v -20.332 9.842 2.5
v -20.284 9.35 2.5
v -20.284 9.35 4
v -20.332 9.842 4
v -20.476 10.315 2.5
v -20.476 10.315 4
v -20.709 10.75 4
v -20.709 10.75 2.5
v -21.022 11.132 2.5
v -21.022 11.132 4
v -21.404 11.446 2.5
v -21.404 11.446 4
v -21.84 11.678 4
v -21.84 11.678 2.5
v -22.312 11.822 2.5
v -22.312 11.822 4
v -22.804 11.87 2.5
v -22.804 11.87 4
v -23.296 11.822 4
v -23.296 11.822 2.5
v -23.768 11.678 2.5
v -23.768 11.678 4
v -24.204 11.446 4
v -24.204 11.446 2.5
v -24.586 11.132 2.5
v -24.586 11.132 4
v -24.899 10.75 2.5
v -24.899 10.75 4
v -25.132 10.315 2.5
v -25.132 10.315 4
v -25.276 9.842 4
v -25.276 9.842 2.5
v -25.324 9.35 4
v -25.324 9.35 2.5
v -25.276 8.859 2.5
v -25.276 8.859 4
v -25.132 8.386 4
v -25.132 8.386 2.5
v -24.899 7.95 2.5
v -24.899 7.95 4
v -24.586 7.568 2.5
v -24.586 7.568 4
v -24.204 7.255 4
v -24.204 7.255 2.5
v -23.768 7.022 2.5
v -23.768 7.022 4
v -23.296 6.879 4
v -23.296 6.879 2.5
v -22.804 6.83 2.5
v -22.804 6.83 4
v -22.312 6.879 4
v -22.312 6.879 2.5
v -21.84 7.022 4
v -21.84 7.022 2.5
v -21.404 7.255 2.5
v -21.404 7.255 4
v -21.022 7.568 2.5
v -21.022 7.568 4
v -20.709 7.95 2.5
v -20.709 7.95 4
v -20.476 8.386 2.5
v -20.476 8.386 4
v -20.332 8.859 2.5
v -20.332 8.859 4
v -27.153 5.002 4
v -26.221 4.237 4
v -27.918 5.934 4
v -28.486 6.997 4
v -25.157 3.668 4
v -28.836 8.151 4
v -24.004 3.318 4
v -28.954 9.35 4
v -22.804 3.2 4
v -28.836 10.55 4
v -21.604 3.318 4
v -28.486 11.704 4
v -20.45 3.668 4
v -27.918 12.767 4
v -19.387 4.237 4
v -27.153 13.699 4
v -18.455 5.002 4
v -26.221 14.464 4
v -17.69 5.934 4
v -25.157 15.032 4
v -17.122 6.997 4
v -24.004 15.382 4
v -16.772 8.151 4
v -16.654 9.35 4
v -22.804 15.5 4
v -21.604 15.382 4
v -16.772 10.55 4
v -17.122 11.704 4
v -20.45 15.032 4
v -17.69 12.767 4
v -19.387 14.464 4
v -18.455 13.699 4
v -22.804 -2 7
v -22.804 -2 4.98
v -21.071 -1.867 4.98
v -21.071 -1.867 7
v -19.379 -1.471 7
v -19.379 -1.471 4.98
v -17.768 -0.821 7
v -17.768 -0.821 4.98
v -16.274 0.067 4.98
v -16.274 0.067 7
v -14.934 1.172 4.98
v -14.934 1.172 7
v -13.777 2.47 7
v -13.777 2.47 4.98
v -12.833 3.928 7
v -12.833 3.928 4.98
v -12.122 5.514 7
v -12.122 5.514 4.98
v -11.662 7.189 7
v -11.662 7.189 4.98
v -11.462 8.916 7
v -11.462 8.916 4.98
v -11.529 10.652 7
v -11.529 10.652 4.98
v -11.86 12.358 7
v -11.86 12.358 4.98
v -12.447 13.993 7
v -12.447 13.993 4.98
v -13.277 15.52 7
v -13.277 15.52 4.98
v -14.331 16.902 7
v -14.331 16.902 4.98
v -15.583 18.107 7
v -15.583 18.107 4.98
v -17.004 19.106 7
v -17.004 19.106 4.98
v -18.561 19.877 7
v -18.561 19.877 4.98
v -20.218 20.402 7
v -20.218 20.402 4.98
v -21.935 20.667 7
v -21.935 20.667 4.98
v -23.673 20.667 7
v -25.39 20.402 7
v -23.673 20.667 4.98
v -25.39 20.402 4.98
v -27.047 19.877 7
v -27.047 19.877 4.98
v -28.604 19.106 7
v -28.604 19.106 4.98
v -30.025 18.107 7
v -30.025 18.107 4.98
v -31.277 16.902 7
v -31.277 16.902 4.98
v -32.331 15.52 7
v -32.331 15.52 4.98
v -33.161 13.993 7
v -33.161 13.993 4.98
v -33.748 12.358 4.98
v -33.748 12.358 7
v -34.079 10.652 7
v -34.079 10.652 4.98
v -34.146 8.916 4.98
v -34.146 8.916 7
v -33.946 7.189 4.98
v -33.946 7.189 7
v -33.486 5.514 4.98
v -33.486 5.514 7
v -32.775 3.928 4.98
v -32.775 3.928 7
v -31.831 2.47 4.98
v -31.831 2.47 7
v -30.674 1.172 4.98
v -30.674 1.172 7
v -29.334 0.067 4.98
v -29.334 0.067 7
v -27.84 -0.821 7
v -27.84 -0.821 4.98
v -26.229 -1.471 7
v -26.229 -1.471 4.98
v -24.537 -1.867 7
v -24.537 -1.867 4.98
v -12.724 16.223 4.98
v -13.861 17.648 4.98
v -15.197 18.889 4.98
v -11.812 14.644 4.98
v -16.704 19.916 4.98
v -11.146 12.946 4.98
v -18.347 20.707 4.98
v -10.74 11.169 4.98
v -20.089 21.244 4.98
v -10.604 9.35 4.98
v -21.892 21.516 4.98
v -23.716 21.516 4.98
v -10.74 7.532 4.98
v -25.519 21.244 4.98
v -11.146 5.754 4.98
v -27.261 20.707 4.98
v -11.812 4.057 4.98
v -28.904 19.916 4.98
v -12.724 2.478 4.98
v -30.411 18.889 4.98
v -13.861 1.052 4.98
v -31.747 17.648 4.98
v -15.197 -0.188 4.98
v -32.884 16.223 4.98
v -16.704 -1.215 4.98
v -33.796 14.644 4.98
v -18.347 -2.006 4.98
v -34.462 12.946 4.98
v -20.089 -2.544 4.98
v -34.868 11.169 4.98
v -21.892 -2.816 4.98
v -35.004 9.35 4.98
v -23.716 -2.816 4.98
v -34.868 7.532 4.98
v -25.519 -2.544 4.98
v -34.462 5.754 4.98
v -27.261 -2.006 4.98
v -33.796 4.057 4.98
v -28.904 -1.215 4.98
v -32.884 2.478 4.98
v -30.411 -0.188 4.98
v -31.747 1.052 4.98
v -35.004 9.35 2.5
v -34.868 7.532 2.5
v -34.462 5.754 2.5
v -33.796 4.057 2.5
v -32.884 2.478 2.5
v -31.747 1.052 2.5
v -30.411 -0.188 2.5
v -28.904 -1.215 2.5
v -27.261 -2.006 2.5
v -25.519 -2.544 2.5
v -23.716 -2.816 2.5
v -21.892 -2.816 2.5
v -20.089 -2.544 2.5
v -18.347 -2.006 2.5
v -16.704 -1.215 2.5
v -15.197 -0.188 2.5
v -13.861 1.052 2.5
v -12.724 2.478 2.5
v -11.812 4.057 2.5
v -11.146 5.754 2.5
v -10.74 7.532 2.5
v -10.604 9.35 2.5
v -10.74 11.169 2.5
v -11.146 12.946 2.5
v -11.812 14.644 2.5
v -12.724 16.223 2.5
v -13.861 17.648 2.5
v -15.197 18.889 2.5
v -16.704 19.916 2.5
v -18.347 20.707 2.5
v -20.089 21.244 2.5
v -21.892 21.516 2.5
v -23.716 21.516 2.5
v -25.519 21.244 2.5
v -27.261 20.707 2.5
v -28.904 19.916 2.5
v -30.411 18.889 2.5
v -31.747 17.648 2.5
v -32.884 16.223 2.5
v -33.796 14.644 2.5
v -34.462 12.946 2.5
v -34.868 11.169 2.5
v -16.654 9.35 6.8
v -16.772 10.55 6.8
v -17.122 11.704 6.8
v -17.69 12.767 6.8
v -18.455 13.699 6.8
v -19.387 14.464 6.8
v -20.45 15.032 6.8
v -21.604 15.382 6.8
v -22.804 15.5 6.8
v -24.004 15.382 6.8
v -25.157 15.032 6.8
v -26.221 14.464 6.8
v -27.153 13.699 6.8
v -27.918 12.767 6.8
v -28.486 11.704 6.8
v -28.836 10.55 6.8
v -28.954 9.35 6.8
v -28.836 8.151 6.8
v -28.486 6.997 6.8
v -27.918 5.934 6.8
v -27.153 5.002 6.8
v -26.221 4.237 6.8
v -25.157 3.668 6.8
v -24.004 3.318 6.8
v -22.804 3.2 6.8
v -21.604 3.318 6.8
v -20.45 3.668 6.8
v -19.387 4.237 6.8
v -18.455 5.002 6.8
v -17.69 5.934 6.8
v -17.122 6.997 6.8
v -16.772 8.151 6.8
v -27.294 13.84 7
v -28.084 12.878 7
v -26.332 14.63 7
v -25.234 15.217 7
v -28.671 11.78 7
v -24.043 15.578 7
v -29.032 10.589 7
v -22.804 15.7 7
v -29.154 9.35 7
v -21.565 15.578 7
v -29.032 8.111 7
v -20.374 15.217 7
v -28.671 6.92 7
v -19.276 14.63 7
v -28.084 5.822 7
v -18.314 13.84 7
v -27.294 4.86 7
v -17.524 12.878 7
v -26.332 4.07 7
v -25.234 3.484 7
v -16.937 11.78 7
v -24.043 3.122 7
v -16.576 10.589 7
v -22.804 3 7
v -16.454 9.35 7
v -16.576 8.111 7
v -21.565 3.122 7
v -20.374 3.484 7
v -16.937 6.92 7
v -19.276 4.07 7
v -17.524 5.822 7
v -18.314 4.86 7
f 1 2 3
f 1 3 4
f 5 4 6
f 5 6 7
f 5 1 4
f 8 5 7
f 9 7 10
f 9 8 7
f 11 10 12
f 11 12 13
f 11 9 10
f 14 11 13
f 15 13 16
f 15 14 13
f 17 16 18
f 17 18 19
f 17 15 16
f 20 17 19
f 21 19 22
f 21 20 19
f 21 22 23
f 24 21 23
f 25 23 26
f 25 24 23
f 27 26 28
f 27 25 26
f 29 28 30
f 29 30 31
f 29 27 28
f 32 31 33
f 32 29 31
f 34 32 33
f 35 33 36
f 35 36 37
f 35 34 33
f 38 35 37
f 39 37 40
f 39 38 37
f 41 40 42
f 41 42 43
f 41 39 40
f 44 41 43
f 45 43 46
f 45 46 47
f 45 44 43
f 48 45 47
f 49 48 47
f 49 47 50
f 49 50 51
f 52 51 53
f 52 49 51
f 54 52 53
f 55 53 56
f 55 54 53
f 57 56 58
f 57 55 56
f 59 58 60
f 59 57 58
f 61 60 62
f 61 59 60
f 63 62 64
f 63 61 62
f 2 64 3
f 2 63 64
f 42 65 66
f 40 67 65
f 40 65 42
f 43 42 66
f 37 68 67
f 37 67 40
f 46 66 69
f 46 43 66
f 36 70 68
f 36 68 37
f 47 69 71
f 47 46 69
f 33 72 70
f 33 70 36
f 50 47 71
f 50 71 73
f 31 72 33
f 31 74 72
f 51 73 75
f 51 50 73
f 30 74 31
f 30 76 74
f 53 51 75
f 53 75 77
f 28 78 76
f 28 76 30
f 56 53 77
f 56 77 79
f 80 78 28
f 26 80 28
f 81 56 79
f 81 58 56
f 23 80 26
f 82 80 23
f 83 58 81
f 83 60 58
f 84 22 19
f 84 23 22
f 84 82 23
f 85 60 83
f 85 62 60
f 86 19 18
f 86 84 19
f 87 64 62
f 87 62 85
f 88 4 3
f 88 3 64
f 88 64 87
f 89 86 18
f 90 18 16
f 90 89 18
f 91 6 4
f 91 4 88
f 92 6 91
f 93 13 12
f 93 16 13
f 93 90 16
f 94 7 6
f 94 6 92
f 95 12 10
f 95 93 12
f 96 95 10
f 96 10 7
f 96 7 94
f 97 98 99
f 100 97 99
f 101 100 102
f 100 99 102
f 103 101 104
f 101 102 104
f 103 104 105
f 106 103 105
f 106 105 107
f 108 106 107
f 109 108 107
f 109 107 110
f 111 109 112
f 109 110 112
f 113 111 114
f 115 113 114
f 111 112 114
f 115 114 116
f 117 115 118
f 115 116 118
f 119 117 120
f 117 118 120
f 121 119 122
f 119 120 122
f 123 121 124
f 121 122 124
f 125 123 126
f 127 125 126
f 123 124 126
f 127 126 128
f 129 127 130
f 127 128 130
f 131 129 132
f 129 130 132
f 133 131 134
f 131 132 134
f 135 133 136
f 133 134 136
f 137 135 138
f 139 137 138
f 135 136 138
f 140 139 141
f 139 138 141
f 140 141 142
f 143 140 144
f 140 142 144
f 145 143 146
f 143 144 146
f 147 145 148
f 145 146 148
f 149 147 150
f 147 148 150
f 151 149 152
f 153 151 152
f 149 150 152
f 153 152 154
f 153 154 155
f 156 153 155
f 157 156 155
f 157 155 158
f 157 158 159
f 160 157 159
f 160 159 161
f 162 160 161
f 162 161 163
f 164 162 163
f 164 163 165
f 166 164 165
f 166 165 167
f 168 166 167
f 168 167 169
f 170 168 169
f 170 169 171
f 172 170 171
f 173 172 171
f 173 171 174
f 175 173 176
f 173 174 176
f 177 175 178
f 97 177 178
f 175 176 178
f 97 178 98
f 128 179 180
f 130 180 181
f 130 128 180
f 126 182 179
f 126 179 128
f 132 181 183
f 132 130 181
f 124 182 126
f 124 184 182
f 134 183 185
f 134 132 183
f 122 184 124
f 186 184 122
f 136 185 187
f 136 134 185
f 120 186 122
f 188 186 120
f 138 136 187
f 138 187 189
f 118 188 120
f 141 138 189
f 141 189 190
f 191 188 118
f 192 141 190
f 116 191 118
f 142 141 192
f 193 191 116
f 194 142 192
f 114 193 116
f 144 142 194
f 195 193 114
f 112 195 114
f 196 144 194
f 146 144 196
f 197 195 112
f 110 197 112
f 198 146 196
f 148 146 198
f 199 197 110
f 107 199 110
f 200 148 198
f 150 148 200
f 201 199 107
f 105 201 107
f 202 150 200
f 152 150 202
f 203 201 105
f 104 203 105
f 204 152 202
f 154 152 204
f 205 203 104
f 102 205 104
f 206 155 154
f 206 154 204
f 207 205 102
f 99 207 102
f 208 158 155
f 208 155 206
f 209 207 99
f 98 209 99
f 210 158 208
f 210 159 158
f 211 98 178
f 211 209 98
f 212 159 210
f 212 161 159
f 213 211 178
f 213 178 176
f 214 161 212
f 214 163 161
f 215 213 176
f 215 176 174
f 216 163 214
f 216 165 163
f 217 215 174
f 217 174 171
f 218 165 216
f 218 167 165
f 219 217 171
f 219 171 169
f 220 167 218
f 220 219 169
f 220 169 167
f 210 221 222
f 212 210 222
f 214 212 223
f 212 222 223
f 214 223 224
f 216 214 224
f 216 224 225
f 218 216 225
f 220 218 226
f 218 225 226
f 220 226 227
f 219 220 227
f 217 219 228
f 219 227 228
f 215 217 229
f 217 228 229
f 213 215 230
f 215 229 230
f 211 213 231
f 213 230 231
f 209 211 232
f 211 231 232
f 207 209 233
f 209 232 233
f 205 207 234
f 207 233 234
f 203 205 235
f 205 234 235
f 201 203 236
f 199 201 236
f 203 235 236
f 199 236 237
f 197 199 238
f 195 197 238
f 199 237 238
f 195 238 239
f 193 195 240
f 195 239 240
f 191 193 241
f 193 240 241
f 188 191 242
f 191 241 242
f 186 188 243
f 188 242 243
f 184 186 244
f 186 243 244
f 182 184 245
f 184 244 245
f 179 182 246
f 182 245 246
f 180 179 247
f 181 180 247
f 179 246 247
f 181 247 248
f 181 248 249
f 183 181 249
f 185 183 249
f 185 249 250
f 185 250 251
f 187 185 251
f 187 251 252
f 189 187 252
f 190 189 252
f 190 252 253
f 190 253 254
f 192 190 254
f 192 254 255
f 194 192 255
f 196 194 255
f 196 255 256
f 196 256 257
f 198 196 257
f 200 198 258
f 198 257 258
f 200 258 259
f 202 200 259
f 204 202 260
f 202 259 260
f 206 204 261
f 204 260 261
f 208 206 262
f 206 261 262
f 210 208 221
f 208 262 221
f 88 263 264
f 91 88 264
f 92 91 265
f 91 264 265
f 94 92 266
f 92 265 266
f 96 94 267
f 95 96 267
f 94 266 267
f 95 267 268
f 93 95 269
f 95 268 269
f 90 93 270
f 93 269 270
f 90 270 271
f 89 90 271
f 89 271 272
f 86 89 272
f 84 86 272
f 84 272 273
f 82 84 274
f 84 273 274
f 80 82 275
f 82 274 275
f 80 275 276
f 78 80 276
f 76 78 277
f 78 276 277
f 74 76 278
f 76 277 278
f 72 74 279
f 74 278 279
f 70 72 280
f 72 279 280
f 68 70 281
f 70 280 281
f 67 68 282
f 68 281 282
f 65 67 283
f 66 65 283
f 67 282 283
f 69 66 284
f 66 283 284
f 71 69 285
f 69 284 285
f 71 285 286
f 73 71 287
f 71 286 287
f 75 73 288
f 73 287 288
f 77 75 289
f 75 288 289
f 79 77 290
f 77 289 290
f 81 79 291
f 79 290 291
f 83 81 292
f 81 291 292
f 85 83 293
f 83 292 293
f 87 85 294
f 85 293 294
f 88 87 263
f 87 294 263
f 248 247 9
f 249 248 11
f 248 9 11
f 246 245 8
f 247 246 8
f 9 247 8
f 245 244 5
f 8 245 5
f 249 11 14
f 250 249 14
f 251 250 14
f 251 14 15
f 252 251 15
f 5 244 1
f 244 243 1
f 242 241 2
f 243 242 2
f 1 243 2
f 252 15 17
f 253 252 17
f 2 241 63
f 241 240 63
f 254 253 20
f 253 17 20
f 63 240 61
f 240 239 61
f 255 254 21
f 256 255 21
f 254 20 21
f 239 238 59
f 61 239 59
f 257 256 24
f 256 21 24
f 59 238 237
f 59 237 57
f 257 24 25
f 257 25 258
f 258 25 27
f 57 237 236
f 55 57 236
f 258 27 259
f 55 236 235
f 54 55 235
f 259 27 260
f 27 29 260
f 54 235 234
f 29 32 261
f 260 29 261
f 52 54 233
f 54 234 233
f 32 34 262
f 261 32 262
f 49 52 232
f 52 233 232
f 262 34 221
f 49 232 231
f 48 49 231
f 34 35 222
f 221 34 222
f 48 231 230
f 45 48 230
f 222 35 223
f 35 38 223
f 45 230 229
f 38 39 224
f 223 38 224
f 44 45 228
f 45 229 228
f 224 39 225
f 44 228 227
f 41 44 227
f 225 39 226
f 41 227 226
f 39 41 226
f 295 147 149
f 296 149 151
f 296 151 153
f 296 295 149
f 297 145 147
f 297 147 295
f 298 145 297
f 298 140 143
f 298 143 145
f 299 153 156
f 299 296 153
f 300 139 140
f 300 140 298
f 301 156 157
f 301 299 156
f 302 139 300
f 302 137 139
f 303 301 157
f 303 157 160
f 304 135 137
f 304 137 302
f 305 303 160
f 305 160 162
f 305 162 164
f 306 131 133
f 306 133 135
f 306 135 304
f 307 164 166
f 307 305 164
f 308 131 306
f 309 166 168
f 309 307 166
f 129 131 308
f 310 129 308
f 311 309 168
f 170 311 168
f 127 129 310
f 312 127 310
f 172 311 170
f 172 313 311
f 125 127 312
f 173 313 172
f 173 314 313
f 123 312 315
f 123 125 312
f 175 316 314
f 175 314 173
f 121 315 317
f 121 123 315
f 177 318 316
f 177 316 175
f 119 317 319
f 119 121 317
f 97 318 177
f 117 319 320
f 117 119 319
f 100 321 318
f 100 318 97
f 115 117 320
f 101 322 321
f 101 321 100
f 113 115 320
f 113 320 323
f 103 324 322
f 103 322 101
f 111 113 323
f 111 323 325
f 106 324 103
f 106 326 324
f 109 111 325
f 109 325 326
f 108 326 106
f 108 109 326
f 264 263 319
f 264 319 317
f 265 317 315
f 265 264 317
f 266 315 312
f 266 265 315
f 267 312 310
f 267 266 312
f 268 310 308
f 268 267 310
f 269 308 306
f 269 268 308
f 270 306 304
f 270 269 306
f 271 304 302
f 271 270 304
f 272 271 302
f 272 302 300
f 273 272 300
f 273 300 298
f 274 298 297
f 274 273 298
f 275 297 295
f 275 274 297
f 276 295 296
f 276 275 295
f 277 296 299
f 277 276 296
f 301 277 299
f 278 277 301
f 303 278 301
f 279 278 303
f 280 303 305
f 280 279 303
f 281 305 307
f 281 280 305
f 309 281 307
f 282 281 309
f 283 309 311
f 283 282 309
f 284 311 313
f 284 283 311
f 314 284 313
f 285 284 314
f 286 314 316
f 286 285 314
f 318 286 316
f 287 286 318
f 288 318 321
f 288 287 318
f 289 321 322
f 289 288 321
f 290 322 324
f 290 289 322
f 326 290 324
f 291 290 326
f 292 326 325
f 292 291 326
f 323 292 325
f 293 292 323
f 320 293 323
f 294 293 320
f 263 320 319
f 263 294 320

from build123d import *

# Parameters (mm, degrees)
EXTRUDE_START       = 2.5
SKETCH_1_R          = 12.2
EXTRUDE_1_DEPTH     = 2.48
EXTRUDE_START_2     = 4.98
SKETCH_2_R          = 11.35
EXTRUDE_2_DEPTH     = 2.02
CUT_EXTRUDE_START   = 7
SKETCH_3_R          = 6.15
CUT_EXTRUDE_1_DEPTH = 3
CHAMFER_1_SIZE      = 0.2
CUT_EXTRUDE_START_2 = 2.5
SKETCH_4_R          = 2.52
CUT_EXTRUDE_2_DEPTH = 1.5


with BuildPart() as part:
    # 草图1 → 凸台-拉伸1 (new body)
    with BuildSketch(Plane.XY.offset(EXTRUDE_START)):
        with Locations(Location((-22.803986485, 9.350307143, 0), (0, 0, 180))):
            Circle(SKETCH_1_R)
    extrude(amount=EXTRUDE_1_DEPTH)

    # 草图2 → 凸台-拉伸2 (add)
    with BuildSketch(Plane.XY.offset(EXTRUDE_START_2)):
        with Locations(Location((-22.803986485, 9.350307143, 0), (0, 0, 270))):
            Circle(SKETCH_2_R)
    extrude(amount=EXTRUDE_2_DEPTH)

    # 草图3 → 切除-拉伸1 (cut)
    with BuildSketch(Plane.XY.offset(CUT_EXTRUDE_START)):
        with Locations((-22.803986485, 9.350307143)):
            Circle(SKETCH_3_R)
    extrude(amount=-CUT_EXTRUDE_1_DEPTH, mode=Mode.SUBTRACT)

    # 倒角1
    chamfer_1_edges = [part.edges().sort_by_distance(p)[0] for p in [
        (-28.953986485, 9.350307143, 7),
    ]]
    chamfer(chamfer_1_edges, length=CHAMFER_1_SIZE)

    # 草图4 → 切除-拉伸2 (cut)
    with BuildSketch(Plane.XY.offset(CUT_EXTRUDE_START_2)):
        with Locations((-22.803986485, 9.350307143)):
            Circle(SKETCH_4_R)
    extrude(amount=CUT_EXTRUDE_2_DEPTH, mode=Mode.SUBTRACT)


solid = part.part
